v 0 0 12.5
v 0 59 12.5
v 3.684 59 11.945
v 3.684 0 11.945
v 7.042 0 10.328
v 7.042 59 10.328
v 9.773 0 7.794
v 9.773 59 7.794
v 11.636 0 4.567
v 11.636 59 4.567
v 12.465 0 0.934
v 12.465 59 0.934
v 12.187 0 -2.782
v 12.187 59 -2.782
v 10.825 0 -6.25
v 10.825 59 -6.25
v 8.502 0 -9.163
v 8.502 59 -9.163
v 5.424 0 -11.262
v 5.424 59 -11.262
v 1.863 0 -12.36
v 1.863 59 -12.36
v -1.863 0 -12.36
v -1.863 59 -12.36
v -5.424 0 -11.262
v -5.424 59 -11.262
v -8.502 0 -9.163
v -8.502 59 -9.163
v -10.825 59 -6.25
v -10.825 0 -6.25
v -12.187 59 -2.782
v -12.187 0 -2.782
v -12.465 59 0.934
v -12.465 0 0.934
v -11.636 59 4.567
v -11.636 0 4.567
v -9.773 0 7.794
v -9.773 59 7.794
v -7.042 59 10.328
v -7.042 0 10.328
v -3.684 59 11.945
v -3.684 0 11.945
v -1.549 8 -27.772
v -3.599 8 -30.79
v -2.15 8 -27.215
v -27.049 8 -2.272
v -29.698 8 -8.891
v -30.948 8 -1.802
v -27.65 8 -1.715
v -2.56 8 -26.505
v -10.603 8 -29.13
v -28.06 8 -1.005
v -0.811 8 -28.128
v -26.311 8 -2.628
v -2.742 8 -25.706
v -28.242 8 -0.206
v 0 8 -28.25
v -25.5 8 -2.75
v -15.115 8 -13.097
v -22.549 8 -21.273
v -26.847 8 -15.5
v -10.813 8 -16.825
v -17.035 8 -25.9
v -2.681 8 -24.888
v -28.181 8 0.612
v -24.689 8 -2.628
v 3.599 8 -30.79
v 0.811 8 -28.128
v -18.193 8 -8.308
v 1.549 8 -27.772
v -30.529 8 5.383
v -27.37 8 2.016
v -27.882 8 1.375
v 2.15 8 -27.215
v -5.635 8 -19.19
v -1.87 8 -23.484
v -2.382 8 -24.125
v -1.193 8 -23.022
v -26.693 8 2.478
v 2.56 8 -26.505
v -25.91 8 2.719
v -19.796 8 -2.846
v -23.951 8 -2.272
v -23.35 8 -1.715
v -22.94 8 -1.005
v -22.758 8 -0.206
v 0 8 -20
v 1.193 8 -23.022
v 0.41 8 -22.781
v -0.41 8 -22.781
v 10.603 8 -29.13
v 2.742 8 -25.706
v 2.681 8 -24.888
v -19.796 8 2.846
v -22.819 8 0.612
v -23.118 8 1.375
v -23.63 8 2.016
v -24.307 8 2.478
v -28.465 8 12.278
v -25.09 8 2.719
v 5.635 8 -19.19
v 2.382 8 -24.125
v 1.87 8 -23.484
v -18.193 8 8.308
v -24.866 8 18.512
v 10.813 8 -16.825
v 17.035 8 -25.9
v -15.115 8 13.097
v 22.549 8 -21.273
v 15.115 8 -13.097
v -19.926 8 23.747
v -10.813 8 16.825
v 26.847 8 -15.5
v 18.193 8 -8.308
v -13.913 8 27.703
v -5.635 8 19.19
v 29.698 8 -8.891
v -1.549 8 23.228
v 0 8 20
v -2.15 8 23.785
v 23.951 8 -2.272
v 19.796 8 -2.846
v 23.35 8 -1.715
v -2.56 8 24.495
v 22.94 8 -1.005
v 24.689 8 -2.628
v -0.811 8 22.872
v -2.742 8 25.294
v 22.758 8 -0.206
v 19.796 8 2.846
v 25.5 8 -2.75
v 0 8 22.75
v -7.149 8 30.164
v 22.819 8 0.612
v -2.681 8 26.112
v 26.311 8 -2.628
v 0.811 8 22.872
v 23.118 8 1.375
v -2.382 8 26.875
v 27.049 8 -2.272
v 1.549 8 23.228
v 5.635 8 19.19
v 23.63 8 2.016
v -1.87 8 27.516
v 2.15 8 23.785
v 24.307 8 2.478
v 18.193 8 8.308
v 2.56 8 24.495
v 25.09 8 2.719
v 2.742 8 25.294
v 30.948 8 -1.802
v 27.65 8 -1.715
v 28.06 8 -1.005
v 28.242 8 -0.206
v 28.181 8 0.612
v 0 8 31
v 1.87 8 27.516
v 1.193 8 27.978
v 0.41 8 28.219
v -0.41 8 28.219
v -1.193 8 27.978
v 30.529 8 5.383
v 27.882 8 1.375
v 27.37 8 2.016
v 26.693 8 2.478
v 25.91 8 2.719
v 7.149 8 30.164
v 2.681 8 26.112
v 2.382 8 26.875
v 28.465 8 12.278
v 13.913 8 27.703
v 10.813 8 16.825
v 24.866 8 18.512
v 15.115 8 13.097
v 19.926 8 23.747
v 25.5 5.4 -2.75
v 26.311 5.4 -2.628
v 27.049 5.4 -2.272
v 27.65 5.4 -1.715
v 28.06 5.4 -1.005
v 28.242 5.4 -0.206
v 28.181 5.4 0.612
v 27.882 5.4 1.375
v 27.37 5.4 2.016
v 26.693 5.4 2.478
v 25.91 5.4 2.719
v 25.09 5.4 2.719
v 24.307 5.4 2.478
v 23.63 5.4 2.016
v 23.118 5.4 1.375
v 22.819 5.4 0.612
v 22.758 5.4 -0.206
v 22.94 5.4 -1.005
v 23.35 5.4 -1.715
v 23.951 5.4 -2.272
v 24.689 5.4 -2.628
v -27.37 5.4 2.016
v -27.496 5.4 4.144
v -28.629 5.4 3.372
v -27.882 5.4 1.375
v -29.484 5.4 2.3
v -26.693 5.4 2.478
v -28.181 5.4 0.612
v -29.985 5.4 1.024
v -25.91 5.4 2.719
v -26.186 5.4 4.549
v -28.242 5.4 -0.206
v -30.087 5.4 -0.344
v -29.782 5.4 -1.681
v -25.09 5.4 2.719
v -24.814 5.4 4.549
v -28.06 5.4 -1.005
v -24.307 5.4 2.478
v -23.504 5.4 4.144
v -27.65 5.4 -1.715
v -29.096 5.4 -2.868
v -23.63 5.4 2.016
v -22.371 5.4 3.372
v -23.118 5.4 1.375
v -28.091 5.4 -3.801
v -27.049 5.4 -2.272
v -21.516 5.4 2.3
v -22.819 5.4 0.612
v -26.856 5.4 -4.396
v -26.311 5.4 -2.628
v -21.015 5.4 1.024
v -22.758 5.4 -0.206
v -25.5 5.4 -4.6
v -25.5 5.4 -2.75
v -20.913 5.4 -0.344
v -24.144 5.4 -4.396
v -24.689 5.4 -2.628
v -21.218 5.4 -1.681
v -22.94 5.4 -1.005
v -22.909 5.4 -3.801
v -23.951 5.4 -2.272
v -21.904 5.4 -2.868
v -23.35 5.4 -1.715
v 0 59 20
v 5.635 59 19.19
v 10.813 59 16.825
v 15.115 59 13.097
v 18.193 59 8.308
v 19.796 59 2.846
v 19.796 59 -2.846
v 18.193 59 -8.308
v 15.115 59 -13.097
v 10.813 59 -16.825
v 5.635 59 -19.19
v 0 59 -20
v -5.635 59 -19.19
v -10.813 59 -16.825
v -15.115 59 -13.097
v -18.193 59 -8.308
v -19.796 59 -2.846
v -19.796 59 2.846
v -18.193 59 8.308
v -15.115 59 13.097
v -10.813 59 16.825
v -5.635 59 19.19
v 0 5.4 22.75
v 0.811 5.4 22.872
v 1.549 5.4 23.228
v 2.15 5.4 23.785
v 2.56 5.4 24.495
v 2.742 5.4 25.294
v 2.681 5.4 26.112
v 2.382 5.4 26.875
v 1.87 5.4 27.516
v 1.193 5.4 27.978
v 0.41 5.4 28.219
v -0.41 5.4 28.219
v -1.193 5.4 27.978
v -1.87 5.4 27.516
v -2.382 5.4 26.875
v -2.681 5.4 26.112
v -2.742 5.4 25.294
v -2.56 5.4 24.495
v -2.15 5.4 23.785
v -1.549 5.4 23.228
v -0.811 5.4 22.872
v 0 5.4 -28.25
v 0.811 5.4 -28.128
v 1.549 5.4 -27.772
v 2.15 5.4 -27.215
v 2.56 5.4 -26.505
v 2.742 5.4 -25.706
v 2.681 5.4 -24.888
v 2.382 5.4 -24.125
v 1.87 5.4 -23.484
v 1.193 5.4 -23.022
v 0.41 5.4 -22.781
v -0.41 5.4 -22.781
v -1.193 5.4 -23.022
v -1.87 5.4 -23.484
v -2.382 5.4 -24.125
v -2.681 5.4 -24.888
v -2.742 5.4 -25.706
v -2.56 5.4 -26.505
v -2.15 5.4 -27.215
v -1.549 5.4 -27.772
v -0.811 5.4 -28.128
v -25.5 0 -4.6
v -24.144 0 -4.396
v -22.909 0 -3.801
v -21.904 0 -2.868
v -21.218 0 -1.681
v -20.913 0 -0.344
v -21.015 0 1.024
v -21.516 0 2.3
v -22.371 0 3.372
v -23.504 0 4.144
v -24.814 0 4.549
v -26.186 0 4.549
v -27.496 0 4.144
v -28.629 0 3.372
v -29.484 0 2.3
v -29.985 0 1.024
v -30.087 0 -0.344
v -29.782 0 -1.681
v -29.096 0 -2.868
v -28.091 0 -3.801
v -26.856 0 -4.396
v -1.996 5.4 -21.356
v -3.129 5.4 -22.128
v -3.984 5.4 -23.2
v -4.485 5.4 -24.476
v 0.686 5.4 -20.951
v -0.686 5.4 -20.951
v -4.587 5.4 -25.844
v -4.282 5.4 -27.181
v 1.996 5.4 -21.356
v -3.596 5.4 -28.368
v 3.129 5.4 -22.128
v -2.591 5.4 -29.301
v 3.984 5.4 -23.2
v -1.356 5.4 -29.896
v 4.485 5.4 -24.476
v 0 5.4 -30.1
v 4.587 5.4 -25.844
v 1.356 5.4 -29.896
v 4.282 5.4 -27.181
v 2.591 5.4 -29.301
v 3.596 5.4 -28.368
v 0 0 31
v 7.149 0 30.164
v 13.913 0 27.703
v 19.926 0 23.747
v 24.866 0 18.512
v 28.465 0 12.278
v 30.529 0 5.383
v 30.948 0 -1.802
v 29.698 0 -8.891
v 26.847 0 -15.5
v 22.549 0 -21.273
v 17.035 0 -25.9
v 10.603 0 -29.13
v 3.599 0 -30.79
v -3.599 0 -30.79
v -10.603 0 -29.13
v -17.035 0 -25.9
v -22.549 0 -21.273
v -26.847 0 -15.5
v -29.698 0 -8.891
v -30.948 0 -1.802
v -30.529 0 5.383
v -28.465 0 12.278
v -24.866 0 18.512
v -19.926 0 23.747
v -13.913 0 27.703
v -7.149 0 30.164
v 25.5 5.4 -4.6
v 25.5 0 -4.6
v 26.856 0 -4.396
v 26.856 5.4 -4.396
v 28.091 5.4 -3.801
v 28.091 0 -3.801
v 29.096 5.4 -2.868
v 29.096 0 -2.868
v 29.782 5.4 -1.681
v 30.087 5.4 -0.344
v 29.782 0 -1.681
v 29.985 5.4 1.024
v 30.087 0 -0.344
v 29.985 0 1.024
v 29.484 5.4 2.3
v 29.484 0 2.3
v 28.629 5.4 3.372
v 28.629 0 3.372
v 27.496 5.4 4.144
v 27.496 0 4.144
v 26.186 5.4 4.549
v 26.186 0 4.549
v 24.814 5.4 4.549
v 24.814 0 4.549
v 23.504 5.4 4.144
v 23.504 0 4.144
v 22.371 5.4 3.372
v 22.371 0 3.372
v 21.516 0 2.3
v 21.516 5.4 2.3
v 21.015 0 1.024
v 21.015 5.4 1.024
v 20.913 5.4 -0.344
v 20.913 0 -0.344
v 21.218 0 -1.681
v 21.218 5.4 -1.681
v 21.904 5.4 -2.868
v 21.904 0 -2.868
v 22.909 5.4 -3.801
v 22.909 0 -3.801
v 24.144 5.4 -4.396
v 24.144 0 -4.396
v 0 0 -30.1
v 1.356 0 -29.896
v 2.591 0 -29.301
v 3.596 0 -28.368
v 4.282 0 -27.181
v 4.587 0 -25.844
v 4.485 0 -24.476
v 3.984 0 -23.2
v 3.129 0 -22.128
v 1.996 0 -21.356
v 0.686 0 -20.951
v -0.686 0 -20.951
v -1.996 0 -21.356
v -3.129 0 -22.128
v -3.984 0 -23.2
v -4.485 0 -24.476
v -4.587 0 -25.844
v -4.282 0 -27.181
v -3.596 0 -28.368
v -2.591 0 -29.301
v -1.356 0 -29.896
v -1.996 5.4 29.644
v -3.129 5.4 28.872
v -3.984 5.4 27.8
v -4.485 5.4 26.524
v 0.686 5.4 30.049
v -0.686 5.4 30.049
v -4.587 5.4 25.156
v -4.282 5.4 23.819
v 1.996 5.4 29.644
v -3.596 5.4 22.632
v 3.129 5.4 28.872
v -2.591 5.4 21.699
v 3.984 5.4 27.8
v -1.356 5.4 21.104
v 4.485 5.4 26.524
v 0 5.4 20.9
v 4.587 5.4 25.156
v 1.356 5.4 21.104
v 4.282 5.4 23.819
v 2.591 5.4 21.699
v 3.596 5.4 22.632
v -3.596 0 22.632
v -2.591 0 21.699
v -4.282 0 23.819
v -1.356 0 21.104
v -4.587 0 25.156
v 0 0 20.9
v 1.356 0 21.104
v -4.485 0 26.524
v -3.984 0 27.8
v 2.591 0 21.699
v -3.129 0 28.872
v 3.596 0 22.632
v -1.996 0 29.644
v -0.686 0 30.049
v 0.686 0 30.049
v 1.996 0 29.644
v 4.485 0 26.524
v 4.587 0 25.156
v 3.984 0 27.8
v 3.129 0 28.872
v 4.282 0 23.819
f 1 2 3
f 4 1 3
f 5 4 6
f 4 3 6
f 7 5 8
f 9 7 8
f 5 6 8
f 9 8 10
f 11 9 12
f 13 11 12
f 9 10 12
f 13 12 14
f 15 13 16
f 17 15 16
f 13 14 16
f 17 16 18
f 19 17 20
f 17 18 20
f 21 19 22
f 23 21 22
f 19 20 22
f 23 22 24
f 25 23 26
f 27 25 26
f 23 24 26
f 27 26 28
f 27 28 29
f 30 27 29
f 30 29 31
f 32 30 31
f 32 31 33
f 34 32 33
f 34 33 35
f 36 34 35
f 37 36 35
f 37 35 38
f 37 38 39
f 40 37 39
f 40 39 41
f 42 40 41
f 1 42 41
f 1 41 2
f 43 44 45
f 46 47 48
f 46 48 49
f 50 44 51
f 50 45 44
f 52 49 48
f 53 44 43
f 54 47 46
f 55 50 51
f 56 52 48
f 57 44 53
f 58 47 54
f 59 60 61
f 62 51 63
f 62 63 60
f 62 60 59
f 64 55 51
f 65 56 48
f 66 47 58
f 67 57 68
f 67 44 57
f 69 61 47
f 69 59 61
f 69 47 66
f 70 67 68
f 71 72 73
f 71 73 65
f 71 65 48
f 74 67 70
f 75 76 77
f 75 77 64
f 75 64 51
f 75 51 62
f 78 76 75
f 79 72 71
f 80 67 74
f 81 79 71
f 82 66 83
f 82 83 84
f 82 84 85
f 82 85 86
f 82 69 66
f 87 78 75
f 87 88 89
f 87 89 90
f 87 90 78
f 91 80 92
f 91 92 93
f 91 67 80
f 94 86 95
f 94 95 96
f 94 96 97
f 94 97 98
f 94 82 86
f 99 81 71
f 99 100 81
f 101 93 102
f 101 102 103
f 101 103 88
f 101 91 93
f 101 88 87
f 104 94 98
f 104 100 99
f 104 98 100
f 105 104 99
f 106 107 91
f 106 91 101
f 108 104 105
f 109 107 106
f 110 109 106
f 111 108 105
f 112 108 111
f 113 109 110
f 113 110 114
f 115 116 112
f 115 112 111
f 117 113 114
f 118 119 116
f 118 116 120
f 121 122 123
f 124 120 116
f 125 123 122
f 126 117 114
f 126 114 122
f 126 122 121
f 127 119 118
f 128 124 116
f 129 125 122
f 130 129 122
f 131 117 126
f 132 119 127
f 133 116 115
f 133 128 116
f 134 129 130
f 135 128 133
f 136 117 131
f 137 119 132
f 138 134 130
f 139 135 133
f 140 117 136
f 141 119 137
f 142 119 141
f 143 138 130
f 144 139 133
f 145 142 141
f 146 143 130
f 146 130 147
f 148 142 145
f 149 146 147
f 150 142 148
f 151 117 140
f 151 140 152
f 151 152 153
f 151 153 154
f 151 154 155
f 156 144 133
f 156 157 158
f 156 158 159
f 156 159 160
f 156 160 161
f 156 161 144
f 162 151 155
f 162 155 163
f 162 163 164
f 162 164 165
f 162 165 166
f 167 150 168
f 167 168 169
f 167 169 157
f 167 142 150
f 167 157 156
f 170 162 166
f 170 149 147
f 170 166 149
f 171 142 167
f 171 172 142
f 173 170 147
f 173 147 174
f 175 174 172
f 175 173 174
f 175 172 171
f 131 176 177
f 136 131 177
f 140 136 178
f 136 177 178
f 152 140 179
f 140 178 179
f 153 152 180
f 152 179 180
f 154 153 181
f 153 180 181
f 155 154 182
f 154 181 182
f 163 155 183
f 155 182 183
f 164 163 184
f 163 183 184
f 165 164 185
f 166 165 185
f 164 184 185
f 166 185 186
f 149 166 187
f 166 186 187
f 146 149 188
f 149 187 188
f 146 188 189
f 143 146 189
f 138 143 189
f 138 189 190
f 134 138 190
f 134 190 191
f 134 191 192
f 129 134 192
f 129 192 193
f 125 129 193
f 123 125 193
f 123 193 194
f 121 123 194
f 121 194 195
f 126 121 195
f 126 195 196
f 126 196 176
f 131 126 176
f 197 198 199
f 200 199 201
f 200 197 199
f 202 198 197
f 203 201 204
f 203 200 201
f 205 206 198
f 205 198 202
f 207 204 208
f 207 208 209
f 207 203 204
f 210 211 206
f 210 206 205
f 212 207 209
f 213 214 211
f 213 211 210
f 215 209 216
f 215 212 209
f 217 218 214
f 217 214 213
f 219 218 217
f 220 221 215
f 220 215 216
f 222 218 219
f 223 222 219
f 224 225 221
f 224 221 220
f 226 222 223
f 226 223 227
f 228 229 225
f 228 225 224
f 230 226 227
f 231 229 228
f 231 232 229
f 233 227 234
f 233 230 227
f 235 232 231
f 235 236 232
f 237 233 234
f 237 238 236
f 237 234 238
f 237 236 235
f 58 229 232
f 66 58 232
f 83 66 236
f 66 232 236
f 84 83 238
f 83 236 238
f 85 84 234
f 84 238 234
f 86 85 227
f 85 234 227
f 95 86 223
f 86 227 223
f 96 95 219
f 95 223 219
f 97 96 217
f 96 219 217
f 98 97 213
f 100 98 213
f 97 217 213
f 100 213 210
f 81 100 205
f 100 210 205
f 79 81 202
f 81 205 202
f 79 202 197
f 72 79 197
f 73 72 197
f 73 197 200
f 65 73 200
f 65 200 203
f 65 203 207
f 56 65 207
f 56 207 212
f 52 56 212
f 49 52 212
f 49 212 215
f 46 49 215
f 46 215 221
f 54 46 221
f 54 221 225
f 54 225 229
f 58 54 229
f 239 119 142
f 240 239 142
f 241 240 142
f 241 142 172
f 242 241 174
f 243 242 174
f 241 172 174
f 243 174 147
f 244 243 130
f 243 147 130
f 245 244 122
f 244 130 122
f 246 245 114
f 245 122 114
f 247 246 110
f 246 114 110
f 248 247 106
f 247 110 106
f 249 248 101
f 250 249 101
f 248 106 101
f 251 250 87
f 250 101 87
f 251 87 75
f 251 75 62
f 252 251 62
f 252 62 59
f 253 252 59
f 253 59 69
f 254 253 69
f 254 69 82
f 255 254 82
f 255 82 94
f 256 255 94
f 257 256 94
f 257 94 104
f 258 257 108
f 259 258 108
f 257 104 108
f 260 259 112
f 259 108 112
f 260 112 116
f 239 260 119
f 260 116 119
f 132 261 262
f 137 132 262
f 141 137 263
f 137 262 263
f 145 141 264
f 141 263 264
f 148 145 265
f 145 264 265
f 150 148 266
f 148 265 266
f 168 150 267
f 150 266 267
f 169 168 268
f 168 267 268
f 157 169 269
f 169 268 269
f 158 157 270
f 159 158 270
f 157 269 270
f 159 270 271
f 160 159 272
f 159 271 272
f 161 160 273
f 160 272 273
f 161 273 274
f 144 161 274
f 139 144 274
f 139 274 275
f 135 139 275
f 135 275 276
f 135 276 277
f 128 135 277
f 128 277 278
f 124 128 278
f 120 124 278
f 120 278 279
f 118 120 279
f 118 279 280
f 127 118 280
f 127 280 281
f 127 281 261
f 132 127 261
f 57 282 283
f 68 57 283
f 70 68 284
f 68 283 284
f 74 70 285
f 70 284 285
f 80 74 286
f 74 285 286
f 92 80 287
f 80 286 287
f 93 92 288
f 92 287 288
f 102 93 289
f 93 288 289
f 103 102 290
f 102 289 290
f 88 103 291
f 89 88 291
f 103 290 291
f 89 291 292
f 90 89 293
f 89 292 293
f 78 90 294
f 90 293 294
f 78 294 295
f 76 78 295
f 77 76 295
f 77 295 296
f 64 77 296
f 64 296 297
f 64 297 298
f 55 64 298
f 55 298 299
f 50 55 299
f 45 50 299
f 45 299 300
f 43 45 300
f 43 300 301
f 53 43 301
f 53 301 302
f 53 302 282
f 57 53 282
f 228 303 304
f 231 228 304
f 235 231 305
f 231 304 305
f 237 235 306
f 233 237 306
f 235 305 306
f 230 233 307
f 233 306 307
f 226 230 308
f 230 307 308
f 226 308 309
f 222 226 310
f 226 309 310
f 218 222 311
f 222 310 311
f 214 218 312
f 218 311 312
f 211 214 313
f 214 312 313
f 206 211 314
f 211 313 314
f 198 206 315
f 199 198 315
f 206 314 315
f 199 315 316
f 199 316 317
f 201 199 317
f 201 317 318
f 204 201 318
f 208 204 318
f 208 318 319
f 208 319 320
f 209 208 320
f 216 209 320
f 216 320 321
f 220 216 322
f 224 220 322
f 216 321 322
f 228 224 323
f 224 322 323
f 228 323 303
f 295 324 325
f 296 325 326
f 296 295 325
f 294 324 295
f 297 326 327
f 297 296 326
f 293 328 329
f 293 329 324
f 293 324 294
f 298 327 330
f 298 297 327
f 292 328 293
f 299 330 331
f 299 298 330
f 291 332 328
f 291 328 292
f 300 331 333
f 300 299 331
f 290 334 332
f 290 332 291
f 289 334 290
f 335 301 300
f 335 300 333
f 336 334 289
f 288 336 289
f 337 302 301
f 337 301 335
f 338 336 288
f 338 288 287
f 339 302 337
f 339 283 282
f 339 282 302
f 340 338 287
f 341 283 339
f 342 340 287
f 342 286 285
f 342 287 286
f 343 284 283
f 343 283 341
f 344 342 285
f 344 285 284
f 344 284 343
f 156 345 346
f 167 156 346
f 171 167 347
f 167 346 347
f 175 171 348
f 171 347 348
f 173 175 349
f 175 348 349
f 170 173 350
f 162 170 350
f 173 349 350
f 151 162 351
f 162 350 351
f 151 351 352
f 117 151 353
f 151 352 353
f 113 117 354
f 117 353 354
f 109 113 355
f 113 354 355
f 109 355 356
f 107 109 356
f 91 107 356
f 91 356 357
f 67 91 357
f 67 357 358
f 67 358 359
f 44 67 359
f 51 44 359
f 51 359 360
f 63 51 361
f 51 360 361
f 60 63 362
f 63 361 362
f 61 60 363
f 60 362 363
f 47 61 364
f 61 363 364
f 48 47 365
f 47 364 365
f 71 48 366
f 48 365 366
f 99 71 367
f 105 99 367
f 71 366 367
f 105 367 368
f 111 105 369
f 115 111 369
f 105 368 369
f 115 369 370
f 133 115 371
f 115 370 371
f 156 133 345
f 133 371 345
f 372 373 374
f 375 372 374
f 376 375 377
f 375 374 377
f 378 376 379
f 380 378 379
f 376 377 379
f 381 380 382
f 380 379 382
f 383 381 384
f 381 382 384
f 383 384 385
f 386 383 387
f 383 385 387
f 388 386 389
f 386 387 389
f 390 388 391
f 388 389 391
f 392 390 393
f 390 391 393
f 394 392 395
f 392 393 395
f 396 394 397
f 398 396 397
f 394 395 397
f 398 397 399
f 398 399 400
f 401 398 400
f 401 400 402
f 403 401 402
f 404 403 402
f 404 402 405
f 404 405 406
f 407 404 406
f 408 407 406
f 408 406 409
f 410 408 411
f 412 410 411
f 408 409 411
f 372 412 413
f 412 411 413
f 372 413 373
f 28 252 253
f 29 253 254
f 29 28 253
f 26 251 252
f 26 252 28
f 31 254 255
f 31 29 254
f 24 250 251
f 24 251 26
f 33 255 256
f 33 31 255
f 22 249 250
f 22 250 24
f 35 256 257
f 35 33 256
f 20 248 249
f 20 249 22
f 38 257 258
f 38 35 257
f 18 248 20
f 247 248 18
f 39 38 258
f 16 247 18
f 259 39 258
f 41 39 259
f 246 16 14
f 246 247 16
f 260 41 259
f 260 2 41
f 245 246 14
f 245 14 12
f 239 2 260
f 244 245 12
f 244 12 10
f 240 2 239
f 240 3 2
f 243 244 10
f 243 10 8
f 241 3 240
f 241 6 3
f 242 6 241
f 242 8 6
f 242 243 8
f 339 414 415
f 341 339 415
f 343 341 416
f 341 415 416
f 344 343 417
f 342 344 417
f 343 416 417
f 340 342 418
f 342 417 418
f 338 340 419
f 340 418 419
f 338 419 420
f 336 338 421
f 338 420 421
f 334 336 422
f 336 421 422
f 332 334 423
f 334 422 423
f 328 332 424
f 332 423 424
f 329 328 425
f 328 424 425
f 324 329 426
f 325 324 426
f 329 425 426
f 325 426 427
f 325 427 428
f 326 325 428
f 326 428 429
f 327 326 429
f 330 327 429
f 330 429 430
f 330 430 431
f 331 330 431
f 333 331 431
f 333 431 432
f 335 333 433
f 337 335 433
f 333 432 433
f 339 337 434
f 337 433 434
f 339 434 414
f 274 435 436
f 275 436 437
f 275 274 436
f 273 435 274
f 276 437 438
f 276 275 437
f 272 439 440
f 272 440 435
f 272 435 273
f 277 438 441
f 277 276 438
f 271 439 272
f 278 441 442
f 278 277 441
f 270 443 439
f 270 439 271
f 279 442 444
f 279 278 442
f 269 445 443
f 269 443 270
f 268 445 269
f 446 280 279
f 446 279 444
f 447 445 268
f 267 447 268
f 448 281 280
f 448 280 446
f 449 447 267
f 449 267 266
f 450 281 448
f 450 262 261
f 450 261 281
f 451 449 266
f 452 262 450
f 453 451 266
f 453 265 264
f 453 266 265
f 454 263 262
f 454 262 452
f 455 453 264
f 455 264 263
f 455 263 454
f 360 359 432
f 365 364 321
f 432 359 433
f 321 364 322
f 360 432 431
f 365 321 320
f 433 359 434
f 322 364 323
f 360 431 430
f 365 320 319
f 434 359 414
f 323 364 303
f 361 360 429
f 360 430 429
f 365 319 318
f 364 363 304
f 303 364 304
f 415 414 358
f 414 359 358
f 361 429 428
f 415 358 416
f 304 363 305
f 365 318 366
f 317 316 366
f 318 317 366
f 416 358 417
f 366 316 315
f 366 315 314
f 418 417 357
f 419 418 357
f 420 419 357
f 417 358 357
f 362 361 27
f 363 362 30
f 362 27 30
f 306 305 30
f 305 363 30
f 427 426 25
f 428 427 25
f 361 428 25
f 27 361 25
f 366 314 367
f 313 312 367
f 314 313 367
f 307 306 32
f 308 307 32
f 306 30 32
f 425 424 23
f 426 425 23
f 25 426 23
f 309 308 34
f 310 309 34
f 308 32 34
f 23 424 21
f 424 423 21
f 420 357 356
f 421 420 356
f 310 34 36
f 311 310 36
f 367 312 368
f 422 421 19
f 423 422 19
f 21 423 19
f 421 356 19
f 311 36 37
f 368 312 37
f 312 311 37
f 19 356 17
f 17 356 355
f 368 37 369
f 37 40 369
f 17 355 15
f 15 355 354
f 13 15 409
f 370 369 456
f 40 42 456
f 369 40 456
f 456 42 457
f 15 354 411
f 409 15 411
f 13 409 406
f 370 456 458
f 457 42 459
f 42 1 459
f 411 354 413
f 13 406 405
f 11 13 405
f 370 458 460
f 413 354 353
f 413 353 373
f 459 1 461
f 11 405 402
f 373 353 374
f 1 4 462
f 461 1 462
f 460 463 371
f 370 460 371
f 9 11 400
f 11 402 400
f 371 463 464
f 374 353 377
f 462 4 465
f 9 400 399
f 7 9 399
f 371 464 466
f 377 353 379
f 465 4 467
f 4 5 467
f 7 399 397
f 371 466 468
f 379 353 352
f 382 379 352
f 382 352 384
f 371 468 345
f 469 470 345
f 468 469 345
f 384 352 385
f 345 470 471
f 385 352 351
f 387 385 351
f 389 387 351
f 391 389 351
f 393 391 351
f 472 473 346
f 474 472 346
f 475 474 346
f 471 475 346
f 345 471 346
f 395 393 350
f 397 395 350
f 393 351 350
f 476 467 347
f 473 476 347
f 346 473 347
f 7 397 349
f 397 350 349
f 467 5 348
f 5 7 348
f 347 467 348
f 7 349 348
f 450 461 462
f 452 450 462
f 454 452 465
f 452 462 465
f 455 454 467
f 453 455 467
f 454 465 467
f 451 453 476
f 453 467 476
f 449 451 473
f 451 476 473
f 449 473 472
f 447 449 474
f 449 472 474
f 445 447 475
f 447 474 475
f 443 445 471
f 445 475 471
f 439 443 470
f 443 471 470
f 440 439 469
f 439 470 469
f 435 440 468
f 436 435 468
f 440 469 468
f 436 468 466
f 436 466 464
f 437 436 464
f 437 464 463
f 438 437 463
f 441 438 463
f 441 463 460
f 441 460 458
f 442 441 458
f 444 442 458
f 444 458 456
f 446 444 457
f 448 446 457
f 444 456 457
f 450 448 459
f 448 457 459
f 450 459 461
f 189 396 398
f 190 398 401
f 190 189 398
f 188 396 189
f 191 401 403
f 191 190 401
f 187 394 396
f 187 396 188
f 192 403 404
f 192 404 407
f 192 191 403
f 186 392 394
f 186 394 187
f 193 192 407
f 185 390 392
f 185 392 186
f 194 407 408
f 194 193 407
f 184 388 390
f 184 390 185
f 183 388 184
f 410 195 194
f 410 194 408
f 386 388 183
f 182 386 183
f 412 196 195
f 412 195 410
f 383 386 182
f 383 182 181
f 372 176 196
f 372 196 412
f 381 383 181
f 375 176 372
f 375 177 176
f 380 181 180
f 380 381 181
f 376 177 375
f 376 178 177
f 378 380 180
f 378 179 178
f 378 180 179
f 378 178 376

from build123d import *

# Parameters (mm, degrees)
SKETCH1_R           = 31
BOSS_EXTRUDE1_DEPTH = 8
SKETCH2_R           = 20
BOSS_EXTRUDE2_DEPTH = 51
SKETCH3_R           = 12.5
CUT_EXTRUDE1_DEPTH  = 74.505101864
SKETCH4_R           = 4.6
CUT_EXTRUDE2_DEPTH  = 5.4
SKETCH5_R           = 2.75
CUT_EXTRUDE3_DEPTH  = 70.245649683


with BuildPart() as part:
    # Sketch1 → Boss-Extrude1 (new body)
    with BuildSketch(Plane(origin=(0, 0, 0), x_dir=(1, 0, 0), z_dir=(0, 1, 0))):
        with Locations(Location((0, 0, 0), (0, 0, 270))):
            Circle(SKETCH1_R)
    extrude(amount=BOSS_EXTRUDE1_DEPTH)

    # Sketch2 → Boss-Extrude2 (add)
    with BuildSketch(Plane(origin=(0, 8, 0), x_dir=(1, 0, 0), z_dir=(0, 1, 0))):
        with Locations(Location((0, 0, 0), (0, 0, 270))):
            Circle(SKETCH2_R)
    extrude(amount=BOSS_EXTRUDE2_DEPTH)

    # Sketch3 → Cut-Extrude1 (cut, through all)
    with BuildSketch(Plane(origin=(0, 59, 0), x_dir=(1, 0, 0), z_dir=(0, 1, 0))):
        with Locations(Location((0, 0, 0), (0, 0, 270))):
            Circle(SKETCH3_R)
    extrude(amount=-CUT_EXTRUDE1_DEPTH, mode=Mode.SUBTRACT)

    # Sketch4 → Cut-Extrude2 (cut)
    with BuildSketch(Plane.XZ):
        with Locations(Location((0, -25.5, 0), (0, 0, 270))):
            Circle(SKETCH4_R)
        with Locations(Location((-25.5, 0, 0), (0, 0, 270))):
            Circle(SKETCH4_R)
        with Locations(Location((0, 25.5, 0), (0, 0, 270))):
            Circle(SKETCH4_R)
        with Locations(Location((25.5, 0, 0), (0, 0, 270))):
            Circle(SKETCH4_R)
    extrude(amount=-CUT_EXTRUDE2_DEPTH, mode=Mode.SUBTRACT)

    # Sketch5 → Cut-Extrude3 (cut, through all)
    with BuildSketch(Plane.XZ.offset(-5.4)):
        with Locations(Location((25.5, 0, 0), (0, 0, 270))):
            Circle(SKETCH5_R)
        with Locations(Location((0, -25.5, 0), (0, 0, 270))):
            Circle(SKETCH5_R)
        with Locations(Location((-25.5, 0, 0), (0, 0, 270))):
            Circle(SKETCH5_R)
        with Locations(Location((0, 25.5, 0), (0, 0, 270))):
            Circle(SKETCH5_R)
    extrude(amount=-CUT_EXTRUDE3_DEPTH, mode=Mode.SUBTRACT)


solid = part.part
